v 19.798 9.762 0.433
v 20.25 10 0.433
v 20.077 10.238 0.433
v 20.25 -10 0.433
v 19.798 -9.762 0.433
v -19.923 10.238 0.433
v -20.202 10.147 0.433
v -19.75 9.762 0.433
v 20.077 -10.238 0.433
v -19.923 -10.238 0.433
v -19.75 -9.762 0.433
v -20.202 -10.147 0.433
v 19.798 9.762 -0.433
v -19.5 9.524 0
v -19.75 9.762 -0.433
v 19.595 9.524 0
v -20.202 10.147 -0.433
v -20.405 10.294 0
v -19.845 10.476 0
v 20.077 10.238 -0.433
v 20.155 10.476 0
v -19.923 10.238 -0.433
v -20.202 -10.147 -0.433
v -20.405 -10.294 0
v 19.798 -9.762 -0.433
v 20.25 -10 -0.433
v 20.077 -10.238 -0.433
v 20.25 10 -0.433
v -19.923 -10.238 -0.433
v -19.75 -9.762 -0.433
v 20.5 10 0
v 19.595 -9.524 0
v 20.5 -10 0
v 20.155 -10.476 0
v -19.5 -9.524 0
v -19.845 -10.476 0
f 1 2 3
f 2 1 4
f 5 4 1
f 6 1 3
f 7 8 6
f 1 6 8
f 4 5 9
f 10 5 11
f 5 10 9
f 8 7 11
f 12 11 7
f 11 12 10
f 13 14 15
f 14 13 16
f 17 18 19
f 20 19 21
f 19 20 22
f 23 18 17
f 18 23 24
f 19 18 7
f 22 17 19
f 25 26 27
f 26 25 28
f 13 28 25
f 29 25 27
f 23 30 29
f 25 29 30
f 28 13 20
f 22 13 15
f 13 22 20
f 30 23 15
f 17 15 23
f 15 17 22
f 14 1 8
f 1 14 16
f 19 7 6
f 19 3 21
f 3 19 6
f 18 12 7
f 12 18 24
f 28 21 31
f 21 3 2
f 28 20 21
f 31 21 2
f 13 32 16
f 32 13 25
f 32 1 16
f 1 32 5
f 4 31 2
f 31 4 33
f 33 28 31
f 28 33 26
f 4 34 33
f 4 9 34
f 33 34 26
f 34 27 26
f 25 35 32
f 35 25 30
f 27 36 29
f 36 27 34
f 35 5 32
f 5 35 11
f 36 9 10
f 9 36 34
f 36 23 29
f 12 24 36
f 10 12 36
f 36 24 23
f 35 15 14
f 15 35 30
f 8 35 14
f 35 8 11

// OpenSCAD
//Generates a path in the shape of a rectangle
function figureL7(x=40,y=20,step=52)=
let(total=(x+x+y+y),steps_x=round(step/total*x),steps_y=round(step/total*y))
concat(
[for(t=[0:steps_x-1])[(-x/2+(x/steps_x)*t),y/2]],
[for(t=[0:steps_y-1])[x/2,y/2-((y/steps_y)*t)]],
[for(t=[0:steps_x-1])[x/2-((x/steps_x)*t),-y/2]],
[for(t=[0:steps_y-1])[-x/2,-y/2+(y/steps_y)*t]]);

function close(p)=concat(p,[p[0]]);
module polyline(p){for(i=[0:max(0,len(p)-2)])color([i%2])line(p[i],p[i+1]);}
module line(p1,p2,width=0.5){hull(){
    translate(p1)sphere(width);
    translate(p2)sphere(width);}}


polyline(close(figureL7()));
 
